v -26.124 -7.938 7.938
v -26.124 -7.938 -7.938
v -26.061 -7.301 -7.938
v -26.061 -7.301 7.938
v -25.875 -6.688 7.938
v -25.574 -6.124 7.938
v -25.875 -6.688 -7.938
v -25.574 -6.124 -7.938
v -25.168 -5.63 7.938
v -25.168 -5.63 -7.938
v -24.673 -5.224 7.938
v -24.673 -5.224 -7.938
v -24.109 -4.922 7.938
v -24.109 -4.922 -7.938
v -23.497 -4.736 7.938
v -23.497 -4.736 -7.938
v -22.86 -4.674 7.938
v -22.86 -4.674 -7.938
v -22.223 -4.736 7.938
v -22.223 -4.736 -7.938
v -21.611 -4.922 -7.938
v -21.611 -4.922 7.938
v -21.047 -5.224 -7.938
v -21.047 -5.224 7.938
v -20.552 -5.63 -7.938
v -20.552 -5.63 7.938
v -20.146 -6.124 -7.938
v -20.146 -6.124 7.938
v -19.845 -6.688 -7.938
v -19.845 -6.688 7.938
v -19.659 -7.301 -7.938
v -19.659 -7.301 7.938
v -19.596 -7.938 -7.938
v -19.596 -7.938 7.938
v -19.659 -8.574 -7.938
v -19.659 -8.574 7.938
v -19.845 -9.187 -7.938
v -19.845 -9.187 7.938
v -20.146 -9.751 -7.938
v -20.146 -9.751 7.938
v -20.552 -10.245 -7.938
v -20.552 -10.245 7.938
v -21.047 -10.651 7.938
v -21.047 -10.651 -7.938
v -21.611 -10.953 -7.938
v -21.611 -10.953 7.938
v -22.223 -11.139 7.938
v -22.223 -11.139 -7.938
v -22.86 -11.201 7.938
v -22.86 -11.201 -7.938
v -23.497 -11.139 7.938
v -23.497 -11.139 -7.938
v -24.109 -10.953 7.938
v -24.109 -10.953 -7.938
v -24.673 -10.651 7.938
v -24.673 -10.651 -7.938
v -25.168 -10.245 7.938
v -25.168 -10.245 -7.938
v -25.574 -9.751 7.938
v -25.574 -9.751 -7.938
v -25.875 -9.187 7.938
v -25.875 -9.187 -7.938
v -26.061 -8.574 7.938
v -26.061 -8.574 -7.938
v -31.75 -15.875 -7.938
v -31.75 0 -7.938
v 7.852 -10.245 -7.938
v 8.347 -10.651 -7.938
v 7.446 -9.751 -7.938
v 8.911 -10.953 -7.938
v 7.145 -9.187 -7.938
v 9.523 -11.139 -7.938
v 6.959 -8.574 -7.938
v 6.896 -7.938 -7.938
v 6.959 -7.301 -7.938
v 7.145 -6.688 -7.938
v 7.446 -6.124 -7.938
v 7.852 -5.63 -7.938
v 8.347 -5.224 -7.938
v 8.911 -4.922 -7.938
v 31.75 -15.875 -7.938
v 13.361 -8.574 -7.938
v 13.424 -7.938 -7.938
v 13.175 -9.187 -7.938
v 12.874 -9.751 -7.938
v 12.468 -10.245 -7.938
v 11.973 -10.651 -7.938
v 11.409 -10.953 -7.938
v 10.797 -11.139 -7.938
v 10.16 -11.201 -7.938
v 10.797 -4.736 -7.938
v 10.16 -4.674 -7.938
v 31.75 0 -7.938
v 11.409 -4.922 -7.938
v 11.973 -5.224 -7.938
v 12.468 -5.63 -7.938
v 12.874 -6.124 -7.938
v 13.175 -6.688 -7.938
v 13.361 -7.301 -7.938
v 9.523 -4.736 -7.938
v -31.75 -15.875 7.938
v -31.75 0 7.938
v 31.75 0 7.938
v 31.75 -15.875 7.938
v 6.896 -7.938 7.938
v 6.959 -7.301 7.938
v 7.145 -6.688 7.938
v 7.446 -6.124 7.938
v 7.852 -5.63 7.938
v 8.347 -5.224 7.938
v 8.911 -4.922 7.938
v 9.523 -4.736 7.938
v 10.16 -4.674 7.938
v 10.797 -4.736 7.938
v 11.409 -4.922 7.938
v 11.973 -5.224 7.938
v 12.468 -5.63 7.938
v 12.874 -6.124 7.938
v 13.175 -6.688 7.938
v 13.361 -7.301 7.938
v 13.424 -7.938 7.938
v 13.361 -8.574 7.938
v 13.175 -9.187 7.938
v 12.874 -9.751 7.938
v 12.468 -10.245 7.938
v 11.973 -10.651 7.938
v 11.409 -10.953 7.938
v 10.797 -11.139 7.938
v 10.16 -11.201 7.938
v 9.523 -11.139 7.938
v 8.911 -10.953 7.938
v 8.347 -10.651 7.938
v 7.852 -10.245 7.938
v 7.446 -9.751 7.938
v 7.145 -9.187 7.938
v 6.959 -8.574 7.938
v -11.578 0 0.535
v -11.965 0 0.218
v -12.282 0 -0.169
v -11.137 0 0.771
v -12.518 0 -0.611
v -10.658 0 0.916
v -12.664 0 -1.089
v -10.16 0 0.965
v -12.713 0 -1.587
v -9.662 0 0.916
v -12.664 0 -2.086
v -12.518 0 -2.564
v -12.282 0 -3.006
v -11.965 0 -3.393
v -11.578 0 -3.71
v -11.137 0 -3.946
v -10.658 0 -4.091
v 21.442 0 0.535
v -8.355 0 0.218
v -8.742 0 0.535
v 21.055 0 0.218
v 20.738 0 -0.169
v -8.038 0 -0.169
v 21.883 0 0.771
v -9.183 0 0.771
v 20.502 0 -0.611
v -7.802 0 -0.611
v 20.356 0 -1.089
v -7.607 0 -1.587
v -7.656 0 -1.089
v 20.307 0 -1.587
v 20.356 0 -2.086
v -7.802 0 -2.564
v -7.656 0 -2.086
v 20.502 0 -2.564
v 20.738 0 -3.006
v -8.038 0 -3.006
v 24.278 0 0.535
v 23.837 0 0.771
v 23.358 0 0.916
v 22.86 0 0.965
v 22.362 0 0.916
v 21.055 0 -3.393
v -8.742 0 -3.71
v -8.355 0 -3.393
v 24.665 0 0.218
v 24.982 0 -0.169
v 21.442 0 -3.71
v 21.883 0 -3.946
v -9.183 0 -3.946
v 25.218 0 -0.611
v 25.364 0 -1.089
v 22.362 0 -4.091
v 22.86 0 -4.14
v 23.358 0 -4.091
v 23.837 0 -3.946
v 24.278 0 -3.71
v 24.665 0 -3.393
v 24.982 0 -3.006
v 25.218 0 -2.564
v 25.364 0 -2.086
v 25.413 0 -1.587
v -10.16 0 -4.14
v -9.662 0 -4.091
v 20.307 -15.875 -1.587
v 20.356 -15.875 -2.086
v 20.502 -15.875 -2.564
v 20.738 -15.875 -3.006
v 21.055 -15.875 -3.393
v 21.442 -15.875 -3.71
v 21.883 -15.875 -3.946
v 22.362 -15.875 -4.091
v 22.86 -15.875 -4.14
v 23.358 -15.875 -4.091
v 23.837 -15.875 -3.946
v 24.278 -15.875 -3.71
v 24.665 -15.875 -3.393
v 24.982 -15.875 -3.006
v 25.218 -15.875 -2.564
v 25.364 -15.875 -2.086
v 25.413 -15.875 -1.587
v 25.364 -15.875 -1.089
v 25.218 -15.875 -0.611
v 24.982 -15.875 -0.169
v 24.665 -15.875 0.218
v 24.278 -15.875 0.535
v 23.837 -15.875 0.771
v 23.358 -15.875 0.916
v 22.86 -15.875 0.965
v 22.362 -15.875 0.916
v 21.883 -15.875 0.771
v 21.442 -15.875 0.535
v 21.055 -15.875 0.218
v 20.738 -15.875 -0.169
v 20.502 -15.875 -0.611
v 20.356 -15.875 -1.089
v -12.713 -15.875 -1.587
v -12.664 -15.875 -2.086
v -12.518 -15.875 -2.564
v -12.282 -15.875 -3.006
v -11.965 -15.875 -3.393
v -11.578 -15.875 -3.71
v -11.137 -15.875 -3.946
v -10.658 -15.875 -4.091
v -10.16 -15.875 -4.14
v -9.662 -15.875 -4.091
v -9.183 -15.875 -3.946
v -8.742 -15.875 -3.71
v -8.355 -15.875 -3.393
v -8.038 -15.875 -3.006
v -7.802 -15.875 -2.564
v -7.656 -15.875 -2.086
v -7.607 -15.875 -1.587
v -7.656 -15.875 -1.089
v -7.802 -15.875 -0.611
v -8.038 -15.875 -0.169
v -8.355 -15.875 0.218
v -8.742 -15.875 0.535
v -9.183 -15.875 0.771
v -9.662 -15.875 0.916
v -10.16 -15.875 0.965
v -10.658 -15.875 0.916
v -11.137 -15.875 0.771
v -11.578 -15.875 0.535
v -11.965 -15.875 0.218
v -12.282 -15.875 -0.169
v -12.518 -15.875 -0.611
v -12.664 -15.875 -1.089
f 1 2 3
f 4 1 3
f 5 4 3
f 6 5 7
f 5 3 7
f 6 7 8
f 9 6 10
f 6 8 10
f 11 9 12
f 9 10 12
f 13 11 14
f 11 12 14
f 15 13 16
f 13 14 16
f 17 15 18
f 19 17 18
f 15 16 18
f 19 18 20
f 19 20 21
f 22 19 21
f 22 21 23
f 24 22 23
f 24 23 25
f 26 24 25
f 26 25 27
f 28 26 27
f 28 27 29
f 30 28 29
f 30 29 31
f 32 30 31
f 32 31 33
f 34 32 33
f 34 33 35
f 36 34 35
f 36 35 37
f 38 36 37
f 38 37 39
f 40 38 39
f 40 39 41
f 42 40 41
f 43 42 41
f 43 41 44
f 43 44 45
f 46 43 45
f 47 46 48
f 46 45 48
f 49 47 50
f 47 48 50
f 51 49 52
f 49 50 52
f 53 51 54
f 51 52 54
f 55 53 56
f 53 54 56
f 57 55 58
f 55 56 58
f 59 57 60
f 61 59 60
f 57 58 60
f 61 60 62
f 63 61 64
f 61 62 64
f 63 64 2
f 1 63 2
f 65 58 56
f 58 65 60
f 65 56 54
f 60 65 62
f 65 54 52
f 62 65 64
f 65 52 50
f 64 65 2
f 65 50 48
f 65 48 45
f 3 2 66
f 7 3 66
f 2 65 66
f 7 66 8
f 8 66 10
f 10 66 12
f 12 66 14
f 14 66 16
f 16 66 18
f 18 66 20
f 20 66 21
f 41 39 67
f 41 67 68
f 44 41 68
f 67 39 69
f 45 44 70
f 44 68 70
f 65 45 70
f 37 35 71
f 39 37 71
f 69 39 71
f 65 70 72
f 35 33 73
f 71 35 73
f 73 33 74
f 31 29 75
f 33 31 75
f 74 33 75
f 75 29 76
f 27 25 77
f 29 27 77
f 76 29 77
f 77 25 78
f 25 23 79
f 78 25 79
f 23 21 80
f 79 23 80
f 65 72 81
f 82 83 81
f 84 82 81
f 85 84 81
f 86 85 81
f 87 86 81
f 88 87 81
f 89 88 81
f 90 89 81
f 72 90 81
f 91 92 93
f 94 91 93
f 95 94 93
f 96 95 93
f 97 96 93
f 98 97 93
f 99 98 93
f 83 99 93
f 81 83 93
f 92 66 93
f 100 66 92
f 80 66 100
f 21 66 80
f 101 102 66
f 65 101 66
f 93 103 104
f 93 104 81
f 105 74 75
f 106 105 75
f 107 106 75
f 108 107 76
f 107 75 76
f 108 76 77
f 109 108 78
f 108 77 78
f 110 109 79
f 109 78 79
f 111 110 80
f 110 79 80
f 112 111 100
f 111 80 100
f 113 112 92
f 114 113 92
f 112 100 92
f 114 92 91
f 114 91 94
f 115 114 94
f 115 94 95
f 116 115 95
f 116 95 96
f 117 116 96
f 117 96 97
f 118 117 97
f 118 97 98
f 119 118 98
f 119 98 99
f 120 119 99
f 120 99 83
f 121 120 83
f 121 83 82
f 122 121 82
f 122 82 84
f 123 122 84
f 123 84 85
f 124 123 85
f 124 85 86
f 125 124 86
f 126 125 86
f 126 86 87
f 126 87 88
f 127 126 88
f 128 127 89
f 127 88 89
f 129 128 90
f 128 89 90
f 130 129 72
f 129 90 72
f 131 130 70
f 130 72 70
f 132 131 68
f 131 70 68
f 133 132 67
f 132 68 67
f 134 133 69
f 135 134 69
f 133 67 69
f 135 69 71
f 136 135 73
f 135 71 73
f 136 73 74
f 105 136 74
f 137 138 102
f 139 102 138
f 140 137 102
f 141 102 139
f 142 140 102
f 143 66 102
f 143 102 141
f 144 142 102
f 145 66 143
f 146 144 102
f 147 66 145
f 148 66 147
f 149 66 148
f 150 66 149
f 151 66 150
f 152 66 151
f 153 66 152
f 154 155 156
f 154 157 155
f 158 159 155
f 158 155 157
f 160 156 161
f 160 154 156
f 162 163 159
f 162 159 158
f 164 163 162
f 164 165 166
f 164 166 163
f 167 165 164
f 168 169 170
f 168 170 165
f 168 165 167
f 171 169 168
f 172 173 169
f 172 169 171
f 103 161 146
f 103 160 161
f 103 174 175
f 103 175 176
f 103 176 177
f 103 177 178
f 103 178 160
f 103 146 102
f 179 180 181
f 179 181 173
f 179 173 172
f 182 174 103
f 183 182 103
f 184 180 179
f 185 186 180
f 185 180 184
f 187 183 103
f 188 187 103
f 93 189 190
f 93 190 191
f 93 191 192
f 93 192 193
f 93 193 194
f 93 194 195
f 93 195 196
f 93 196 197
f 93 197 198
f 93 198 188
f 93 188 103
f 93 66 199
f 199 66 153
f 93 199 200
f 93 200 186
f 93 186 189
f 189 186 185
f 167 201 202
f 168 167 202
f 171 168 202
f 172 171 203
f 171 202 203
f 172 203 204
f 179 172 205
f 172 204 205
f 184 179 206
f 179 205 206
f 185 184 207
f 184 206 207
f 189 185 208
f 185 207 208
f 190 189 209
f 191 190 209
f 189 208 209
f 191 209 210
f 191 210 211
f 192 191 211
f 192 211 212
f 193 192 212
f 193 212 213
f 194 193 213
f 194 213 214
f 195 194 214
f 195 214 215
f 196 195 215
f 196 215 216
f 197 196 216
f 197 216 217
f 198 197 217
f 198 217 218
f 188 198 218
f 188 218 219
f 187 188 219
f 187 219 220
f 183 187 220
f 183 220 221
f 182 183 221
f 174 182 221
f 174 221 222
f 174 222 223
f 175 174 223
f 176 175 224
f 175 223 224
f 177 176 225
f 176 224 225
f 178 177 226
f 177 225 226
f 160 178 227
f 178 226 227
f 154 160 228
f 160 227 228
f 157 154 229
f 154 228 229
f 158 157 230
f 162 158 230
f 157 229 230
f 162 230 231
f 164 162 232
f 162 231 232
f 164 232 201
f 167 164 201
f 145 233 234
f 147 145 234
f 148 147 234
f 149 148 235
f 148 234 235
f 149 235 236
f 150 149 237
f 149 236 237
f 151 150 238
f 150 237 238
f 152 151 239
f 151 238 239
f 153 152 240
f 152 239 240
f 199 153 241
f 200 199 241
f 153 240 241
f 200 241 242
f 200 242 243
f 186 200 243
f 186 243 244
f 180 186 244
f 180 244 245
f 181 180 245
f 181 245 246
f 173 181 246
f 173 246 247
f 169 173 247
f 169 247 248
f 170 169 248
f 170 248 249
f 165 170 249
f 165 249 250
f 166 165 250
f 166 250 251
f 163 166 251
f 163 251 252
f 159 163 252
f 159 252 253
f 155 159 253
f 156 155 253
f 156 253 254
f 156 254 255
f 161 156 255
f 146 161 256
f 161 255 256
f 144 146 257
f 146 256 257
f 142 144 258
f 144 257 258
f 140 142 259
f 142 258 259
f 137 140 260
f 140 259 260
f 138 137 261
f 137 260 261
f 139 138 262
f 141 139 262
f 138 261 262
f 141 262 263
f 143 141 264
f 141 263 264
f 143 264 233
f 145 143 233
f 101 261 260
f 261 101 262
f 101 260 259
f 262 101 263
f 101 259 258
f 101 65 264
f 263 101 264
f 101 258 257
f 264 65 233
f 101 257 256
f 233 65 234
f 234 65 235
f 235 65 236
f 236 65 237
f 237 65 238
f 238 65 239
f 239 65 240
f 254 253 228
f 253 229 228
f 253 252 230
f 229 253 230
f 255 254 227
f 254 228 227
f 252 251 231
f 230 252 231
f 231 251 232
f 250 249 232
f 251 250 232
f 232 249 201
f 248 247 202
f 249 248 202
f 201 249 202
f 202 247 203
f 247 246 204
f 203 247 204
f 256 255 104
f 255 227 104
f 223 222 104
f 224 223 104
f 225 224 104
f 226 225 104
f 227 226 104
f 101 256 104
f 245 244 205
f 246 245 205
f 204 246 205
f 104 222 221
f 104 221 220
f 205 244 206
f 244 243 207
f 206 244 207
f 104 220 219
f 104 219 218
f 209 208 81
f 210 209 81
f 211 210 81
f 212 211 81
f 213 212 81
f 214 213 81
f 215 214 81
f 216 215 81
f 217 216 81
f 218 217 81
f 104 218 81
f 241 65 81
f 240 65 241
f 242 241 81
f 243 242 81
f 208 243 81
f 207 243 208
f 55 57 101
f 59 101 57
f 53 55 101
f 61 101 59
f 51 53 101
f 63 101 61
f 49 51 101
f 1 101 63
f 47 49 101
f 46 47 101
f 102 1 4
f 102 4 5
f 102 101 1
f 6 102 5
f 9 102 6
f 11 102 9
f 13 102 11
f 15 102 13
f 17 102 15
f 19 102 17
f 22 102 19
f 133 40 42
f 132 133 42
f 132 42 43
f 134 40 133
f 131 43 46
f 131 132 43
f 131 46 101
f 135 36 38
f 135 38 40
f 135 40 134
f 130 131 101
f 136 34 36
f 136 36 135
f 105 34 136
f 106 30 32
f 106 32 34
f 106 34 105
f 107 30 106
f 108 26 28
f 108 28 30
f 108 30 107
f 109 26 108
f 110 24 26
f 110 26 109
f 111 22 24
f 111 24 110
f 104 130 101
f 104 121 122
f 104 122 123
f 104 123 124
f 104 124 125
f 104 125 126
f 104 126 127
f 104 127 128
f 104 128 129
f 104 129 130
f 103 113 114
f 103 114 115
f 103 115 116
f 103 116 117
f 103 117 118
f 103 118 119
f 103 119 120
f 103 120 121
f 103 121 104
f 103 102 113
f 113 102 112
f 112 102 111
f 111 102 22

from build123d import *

# Parameters (mm, degrees)
SKETCH2_W              = 63.5
SKETCH2_H              = 15.875
BOSS_EXTRUDE1_DEPTH    = 15.875
F_1_4_20_TAPPED_HOLE_D = 5.1054
F_1_4_CLEARANCE_HOLE_D = 6.5278


with BuildPart() as part:
    # Sketch2 → Boss-Extrude1 (new body)
    with BuildSketch(Plane(origin=(0, 0, 0), x_dir=(1, 0, 0), z_dir=(0, 1, 0))):
        Rectangle(SKETCH2_W, SKETCH2_H)
    extrude(amount=-BOSS_EXTRUDE1_DEPTH)

    # 1/4-20 Tapped Hole (through all)
    with Locations(Plane(origin=(0, 0, 0), x_dir=(1, 0, 0), z_dir=(0, 1, 0))):
        with Locations((-10.16, 1.5875), (22.86, 1.5875)):
            Hole(F_1_4_20_TAPPED_HOLE_D / 2)

    # 1/4 Clearance Hole (through all)
    with Locations(Plane.XY.offset(7.9375)):
        with Locations((-22.86, -7.9375), (10.16, -7.9375)):
            Hole(F_1_4_CLEARANCE_HOLE_D / 2)


solid = part.part
